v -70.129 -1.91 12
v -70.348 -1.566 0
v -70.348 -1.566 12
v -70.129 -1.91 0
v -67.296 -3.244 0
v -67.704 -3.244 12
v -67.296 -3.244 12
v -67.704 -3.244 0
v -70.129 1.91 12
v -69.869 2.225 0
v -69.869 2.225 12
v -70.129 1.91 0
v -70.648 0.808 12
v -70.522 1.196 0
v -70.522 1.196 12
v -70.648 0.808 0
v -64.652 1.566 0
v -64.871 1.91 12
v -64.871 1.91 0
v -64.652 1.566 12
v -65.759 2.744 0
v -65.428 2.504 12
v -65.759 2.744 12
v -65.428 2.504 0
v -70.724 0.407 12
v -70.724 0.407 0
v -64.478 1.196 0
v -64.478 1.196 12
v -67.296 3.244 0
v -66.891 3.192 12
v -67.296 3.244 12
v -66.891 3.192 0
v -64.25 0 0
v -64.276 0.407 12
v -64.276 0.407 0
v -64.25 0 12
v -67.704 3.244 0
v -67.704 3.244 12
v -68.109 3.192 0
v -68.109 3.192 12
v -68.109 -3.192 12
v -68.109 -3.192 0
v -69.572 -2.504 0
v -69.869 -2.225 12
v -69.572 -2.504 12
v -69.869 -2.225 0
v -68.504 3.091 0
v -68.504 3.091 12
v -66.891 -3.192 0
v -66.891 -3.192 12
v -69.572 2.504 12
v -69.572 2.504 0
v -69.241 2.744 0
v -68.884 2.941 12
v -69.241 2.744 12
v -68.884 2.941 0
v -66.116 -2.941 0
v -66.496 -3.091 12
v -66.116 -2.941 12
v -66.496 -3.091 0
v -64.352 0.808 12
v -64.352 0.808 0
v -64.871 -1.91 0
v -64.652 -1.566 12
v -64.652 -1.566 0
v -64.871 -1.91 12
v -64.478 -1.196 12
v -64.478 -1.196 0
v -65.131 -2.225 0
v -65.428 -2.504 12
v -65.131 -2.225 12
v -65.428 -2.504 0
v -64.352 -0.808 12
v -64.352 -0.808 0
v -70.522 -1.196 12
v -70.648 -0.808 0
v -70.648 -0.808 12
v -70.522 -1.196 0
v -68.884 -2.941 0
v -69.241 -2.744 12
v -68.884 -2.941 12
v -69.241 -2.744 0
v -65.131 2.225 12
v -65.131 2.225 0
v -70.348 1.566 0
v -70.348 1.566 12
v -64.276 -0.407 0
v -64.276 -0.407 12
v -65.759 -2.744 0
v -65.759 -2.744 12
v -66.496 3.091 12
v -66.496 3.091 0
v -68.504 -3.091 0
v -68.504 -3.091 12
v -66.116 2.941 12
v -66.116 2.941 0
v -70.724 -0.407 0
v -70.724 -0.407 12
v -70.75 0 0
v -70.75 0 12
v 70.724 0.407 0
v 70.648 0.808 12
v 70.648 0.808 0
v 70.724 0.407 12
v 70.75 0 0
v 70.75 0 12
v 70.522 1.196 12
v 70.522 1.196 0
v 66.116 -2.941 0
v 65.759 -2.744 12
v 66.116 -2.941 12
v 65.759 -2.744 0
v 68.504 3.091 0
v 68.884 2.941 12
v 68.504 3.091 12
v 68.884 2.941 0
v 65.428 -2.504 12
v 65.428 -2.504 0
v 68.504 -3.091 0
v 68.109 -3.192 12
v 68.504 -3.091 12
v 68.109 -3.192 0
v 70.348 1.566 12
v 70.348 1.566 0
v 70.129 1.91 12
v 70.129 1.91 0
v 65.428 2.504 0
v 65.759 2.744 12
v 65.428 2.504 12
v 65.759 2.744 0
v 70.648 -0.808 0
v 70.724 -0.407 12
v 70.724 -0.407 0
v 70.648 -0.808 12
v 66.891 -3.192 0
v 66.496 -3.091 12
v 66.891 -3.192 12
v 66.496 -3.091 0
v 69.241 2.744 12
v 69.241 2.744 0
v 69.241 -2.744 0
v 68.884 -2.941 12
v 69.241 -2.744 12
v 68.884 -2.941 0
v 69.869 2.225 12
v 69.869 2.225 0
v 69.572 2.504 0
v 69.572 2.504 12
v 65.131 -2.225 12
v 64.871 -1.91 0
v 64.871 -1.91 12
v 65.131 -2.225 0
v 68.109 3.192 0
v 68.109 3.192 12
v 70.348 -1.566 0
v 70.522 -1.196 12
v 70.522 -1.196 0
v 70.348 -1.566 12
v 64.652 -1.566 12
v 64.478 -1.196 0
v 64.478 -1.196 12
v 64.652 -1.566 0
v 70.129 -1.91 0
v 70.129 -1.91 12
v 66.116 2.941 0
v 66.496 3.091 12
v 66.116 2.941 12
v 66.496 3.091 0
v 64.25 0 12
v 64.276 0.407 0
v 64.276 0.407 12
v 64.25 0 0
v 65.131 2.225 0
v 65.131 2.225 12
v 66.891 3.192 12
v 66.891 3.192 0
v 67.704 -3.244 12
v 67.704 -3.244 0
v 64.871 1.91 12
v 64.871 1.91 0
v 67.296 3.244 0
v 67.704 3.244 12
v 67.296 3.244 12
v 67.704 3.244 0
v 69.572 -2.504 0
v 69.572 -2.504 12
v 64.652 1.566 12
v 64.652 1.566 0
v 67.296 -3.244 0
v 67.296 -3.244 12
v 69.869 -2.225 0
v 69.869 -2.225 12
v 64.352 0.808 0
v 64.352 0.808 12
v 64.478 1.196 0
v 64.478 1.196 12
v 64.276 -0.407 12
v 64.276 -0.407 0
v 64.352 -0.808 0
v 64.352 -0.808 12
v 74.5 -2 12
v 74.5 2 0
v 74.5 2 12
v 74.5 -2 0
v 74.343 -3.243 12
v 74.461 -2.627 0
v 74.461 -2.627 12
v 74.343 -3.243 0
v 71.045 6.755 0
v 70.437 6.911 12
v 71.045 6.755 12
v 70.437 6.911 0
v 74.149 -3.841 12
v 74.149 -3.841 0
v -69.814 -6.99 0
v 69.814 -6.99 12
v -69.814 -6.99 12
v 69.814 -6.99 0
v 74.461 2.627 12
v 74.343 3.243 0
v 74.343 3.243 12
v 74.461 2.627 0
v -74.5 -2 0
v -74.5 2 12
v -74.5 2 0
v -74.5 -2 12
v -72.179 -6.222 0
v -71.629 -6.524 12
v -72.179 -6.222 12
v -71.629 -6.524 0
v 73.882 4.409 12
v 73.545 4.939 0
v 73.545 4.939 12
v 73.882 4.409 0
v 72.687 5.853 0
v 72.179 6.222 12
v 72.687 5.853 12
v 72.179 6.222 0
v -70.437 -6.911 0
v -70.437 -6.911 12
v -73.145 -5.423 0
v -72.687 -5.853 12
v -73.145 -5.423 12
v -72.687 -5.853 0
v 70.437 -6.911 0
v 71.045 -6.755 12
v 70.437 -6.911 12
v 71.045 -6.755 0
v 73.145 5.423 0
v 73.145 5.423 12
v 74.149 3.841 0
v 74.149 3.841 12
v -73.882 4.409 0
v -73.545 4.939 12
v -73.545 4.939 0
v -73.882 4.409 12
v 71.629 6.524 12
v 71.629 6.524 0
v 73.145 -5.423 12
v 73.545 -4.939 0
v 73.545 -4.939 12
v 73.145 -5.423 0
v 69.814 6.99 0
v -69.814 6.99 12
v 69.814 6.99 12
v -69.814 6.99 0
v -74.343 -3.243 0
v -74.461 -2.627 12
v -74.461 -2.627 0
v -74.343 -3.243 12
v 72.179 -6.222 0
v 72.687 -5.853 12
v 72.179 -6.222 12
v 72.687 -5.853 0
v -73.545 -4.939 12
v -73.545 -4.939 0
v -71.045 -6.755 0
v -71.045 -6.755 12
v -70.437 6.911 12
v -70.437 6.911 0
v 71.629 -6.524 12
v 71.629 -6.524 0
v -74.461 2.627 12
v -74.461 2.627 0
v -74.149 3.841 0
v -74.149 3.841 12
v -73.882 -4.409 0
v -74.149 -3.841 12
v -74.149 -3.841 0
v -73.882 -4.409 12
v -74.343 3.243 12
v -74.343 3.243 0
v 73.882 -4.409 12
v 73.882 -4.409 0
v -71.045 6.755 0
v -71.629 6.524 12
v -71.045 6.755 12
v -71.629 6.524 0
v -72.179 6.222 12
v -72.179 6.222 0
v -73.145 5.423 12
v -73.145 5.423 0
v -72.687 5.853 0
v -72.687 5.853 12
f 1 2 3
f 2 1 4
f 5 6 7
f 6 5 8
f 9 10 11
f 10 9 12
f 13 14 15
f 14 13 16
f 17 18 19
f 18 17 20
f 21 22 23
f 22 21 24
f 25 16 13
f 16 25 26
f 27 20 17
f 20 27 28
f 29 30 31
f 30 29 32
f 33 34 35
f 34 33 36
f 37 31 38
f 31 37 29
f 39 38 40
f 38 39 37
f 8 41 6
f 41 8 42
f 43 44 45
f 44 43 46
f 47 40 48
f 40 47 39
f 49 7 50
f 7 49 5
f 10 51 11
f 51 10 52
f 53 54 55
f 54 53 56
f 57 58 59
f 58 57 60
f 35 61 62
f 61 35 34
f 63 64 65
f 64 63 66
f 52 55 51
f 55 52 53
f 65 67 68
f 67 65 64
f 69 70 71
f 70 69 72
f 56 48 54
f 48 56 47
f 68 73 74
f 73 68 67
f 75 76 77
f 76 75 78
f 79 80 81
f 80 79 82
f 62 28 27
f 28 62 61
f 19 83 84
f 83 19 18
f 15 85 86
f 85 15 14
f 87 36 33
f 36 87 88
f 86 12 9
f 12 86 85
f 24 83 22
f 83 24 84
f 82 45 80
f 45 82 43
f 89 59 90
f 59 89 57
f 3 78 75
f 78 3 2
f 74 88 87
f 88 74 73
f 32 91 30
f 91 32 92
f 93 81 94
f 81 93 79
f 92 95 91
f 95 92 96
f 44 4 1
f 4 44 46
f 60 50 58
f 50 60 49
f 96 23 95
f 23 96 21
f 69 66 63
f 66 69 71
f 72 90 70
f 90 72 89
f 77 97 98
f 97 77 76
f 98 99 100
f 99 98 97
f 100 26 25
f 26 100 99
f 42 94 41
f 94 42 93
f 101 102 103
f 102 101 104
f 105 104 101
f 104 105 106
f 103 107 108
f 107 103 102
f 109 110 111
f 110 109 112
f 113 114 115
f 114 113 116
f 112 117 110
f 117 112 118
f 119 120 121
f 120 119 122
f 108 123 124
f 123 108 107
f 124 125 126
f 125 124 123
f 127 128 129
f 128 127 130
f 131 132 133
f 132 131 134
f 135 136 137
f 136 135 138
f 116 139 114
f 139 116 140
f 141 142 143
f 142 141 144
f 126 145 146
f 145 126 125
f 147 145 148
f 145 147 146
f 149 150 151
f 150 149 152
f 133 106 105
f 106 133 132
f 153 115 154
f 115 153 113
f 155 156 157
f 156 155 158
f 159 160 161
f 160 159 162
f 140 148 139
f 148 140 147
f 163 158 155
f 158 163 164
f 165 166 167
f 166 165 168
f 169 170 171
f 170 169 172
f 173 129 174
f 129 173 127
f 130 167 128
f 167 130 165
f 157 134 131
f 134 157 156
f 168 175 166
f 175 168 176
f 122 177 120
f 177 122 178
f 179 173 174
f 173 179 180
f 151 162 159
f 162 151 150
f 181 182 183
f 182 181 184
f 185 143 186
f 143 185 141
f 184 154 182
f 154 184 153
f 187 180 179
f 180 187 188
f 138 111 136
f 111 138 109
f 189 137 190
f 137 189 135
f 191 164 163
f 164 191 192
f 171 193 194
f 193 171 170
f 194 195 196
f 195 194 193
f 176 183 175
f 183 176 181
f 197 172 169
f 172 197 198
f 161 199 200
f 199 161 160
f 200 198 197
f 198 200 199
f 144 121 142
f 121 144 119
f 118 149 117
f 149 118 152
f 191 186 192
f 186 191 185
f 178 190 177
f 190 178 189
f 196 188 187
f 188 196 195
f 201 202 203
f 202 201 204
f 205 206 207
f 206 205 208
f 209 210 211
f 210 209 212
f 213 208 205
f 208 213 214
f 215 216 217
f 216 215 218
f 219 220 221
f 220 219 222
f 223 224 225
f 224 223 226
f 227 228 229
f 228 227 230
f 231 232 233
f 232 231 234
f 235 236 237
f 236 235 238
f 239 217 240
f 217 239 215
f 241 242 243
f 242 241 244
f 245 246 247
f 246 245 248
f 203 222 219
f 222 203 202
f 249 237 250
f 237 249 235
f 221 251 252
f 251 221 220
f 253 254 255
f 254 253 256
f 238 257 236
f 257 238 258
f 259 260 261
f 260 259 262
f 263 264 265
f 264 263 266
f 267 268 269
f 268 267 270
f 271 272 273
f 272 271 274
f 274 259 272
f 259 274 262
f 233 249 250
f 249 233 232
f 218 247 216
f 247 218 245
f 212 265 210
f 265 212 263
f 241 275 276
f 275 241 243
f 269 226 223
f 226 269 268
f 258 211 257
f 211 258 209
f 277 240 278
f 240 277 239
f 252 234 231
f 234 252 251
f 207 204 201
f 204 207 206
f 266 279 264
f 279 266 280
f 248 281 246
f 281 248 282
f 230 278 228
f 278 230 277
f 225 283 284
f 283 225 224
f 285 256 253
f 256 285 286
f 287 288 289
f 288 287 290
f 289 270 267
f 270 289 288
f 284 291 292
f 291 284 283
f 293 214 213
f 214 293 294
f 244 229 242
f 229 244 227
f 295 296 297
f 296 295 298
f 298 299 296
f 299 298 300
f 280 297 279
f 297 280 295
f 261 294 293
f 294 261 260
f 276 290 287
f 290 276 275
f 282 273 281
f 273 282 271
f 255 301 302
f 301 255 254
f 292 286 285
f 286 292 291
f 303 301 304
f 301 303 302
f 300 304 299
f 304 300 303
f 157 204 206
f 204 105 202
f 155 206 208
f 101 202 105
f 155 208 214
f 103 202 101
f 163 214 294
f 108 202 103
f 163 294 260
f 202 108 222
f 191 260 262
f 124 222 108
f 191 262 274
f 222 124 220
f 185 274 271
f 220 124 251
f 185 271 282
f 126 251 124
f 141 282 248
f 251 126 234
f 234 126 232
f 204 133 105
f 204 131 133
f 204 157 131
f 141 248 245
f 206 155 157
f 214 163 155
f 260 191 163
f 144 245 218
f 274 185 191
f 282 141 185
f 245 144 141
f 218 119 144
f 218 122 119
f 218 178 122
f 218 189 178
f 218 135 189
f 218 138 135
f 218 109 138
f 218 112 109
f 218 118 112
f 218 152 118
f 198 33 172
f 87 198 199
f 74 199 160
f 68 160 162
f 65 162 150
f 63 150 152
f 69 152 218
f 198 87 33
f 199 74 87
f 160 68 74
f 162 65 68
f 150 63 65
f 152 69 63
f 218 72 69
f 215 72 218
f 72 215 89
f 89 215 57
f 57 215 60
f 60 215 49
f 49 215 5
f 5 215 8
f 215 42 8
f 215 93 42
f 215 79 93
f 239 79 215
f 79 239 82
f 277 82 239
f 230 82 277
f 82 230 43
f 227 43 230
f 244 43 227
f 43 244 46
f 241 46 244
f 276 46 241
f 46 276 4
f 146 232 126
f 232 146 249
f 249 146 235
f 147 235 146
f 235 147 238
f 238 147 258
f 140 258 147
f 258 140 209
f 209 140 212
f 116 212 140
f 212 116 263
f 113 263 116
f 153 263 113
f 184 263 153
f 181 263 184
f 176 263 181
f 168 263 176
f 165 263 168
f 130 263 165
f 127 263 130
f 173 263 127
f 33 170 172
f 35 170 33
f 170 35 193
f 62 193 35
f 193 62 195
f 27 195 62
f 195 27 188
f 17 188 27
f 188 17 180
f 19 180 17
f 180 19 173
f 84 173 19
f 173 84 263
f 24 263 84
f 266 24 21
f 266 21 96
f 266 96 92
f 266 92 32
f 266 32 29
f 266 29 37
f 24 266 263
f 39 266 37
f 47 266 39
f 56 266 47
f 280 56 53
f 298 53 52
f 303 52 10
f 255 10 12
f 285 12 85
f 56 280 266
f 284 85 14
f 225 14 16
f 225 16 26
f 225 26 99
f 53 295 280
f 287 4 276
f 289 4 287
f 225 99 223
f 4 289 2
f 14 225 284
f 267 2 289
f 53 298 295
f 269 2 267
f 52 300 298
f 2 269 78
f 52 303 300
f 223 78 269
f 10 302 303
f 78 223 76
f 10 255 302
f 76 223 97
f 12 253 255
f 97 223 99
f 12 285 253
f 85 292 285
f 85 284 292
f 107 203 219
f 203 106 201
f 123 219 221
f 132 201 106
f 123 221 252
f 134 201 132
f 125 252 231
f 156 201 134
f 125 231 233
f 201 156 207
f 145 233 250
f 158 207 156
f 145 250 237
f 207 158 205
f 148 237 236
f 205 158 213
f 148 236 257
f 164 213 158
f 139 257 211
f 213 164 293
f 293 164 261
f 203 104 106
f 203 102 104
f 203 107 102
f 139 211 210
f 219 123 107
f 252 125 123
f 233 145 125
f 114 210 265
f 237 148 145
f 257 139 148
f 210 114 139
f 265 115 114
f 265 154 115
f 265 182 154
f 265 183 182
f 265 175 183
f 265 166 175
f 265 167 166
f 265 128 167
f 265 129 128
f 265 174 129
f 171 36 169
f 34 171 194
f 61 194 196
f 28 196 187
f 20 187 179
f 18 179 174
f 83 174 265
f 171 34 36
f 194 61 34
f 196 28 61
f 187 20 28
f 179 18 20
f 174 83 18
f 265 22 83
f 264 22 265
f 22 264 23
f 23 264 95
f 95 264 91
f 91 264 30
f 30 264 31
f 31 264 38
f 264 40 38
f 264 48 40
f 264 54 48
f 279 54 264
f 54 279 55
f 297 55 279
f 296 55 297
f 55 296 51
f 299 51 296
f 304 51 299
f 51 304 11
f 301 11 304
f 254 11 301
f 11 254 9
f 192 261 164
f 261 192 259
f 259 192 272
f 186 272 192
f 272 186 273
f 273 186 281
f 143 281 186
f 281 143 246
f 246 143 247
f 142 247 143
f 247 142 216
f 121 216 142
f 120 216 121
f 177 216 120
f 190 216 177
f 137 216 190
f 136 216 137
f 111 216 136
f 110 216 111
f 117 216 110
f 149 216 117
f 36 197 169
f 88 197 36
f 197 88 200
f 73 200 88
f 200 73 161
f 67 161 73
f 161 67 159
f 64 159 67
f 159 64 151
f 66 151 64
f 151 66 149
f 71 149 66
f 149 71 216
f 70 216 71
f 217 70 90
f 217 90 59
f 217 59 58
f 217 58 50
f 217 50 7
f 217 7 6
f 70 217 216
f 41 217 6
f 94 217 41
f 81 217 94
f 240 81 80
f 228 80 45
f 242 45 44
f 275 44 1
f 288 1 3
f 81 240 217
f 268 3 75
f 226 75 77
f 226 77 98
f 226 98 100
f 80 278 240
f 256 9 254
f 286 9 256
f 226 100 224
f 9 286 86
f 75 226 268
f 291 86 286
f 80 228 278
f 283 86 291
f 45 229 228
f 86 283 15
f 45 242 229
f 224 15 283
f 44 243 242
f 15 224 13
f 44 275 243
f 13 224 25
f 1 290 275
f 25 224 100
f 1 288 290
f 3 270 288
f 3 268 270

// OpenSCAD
$fn = 50;


difference() {
	union() {
		hull() {
			translate(v = [-69.5000000000, 2.0000000000, 0]) {
				cylinder(h = 12, r = 5);
			}
			translate(v = [69.5000000000, 2.0000000000, 0]) {
				cylinder(h = 12, r = 5);
			}
			translate(v = [-69.5000000000, -2.0000000000, 0]) {
				cylinder(h = 12, r = 5);
			}
			translate(v = [69.5000000000, -2.0000000000, 0]) {
				cylinder(h = 12, r = 5);
			}
		}
	}
	union() {
		translate(v = [-67.5000000000, 0.0000000000, -100.0000000000]) {
			cylinder(h = 200, r = 3.2500000000);
		}
		translate(v = [-67.5000000000, 0.0000000000, -100.0000000000]) {
			cylinder(h = 200, r = 3.2500000000);
		}
		translate(v = [67.5000000000, 0.0000000000, -100.0000000000]) {
			cylinder(h = 200, r = 3.2500000000);
		}
		translate(v = [67.5000000000, 0.0000000000, -100.0000000000]) {
			cylinder(h = 200, r = 3.2500000000);
		}
	}
}
